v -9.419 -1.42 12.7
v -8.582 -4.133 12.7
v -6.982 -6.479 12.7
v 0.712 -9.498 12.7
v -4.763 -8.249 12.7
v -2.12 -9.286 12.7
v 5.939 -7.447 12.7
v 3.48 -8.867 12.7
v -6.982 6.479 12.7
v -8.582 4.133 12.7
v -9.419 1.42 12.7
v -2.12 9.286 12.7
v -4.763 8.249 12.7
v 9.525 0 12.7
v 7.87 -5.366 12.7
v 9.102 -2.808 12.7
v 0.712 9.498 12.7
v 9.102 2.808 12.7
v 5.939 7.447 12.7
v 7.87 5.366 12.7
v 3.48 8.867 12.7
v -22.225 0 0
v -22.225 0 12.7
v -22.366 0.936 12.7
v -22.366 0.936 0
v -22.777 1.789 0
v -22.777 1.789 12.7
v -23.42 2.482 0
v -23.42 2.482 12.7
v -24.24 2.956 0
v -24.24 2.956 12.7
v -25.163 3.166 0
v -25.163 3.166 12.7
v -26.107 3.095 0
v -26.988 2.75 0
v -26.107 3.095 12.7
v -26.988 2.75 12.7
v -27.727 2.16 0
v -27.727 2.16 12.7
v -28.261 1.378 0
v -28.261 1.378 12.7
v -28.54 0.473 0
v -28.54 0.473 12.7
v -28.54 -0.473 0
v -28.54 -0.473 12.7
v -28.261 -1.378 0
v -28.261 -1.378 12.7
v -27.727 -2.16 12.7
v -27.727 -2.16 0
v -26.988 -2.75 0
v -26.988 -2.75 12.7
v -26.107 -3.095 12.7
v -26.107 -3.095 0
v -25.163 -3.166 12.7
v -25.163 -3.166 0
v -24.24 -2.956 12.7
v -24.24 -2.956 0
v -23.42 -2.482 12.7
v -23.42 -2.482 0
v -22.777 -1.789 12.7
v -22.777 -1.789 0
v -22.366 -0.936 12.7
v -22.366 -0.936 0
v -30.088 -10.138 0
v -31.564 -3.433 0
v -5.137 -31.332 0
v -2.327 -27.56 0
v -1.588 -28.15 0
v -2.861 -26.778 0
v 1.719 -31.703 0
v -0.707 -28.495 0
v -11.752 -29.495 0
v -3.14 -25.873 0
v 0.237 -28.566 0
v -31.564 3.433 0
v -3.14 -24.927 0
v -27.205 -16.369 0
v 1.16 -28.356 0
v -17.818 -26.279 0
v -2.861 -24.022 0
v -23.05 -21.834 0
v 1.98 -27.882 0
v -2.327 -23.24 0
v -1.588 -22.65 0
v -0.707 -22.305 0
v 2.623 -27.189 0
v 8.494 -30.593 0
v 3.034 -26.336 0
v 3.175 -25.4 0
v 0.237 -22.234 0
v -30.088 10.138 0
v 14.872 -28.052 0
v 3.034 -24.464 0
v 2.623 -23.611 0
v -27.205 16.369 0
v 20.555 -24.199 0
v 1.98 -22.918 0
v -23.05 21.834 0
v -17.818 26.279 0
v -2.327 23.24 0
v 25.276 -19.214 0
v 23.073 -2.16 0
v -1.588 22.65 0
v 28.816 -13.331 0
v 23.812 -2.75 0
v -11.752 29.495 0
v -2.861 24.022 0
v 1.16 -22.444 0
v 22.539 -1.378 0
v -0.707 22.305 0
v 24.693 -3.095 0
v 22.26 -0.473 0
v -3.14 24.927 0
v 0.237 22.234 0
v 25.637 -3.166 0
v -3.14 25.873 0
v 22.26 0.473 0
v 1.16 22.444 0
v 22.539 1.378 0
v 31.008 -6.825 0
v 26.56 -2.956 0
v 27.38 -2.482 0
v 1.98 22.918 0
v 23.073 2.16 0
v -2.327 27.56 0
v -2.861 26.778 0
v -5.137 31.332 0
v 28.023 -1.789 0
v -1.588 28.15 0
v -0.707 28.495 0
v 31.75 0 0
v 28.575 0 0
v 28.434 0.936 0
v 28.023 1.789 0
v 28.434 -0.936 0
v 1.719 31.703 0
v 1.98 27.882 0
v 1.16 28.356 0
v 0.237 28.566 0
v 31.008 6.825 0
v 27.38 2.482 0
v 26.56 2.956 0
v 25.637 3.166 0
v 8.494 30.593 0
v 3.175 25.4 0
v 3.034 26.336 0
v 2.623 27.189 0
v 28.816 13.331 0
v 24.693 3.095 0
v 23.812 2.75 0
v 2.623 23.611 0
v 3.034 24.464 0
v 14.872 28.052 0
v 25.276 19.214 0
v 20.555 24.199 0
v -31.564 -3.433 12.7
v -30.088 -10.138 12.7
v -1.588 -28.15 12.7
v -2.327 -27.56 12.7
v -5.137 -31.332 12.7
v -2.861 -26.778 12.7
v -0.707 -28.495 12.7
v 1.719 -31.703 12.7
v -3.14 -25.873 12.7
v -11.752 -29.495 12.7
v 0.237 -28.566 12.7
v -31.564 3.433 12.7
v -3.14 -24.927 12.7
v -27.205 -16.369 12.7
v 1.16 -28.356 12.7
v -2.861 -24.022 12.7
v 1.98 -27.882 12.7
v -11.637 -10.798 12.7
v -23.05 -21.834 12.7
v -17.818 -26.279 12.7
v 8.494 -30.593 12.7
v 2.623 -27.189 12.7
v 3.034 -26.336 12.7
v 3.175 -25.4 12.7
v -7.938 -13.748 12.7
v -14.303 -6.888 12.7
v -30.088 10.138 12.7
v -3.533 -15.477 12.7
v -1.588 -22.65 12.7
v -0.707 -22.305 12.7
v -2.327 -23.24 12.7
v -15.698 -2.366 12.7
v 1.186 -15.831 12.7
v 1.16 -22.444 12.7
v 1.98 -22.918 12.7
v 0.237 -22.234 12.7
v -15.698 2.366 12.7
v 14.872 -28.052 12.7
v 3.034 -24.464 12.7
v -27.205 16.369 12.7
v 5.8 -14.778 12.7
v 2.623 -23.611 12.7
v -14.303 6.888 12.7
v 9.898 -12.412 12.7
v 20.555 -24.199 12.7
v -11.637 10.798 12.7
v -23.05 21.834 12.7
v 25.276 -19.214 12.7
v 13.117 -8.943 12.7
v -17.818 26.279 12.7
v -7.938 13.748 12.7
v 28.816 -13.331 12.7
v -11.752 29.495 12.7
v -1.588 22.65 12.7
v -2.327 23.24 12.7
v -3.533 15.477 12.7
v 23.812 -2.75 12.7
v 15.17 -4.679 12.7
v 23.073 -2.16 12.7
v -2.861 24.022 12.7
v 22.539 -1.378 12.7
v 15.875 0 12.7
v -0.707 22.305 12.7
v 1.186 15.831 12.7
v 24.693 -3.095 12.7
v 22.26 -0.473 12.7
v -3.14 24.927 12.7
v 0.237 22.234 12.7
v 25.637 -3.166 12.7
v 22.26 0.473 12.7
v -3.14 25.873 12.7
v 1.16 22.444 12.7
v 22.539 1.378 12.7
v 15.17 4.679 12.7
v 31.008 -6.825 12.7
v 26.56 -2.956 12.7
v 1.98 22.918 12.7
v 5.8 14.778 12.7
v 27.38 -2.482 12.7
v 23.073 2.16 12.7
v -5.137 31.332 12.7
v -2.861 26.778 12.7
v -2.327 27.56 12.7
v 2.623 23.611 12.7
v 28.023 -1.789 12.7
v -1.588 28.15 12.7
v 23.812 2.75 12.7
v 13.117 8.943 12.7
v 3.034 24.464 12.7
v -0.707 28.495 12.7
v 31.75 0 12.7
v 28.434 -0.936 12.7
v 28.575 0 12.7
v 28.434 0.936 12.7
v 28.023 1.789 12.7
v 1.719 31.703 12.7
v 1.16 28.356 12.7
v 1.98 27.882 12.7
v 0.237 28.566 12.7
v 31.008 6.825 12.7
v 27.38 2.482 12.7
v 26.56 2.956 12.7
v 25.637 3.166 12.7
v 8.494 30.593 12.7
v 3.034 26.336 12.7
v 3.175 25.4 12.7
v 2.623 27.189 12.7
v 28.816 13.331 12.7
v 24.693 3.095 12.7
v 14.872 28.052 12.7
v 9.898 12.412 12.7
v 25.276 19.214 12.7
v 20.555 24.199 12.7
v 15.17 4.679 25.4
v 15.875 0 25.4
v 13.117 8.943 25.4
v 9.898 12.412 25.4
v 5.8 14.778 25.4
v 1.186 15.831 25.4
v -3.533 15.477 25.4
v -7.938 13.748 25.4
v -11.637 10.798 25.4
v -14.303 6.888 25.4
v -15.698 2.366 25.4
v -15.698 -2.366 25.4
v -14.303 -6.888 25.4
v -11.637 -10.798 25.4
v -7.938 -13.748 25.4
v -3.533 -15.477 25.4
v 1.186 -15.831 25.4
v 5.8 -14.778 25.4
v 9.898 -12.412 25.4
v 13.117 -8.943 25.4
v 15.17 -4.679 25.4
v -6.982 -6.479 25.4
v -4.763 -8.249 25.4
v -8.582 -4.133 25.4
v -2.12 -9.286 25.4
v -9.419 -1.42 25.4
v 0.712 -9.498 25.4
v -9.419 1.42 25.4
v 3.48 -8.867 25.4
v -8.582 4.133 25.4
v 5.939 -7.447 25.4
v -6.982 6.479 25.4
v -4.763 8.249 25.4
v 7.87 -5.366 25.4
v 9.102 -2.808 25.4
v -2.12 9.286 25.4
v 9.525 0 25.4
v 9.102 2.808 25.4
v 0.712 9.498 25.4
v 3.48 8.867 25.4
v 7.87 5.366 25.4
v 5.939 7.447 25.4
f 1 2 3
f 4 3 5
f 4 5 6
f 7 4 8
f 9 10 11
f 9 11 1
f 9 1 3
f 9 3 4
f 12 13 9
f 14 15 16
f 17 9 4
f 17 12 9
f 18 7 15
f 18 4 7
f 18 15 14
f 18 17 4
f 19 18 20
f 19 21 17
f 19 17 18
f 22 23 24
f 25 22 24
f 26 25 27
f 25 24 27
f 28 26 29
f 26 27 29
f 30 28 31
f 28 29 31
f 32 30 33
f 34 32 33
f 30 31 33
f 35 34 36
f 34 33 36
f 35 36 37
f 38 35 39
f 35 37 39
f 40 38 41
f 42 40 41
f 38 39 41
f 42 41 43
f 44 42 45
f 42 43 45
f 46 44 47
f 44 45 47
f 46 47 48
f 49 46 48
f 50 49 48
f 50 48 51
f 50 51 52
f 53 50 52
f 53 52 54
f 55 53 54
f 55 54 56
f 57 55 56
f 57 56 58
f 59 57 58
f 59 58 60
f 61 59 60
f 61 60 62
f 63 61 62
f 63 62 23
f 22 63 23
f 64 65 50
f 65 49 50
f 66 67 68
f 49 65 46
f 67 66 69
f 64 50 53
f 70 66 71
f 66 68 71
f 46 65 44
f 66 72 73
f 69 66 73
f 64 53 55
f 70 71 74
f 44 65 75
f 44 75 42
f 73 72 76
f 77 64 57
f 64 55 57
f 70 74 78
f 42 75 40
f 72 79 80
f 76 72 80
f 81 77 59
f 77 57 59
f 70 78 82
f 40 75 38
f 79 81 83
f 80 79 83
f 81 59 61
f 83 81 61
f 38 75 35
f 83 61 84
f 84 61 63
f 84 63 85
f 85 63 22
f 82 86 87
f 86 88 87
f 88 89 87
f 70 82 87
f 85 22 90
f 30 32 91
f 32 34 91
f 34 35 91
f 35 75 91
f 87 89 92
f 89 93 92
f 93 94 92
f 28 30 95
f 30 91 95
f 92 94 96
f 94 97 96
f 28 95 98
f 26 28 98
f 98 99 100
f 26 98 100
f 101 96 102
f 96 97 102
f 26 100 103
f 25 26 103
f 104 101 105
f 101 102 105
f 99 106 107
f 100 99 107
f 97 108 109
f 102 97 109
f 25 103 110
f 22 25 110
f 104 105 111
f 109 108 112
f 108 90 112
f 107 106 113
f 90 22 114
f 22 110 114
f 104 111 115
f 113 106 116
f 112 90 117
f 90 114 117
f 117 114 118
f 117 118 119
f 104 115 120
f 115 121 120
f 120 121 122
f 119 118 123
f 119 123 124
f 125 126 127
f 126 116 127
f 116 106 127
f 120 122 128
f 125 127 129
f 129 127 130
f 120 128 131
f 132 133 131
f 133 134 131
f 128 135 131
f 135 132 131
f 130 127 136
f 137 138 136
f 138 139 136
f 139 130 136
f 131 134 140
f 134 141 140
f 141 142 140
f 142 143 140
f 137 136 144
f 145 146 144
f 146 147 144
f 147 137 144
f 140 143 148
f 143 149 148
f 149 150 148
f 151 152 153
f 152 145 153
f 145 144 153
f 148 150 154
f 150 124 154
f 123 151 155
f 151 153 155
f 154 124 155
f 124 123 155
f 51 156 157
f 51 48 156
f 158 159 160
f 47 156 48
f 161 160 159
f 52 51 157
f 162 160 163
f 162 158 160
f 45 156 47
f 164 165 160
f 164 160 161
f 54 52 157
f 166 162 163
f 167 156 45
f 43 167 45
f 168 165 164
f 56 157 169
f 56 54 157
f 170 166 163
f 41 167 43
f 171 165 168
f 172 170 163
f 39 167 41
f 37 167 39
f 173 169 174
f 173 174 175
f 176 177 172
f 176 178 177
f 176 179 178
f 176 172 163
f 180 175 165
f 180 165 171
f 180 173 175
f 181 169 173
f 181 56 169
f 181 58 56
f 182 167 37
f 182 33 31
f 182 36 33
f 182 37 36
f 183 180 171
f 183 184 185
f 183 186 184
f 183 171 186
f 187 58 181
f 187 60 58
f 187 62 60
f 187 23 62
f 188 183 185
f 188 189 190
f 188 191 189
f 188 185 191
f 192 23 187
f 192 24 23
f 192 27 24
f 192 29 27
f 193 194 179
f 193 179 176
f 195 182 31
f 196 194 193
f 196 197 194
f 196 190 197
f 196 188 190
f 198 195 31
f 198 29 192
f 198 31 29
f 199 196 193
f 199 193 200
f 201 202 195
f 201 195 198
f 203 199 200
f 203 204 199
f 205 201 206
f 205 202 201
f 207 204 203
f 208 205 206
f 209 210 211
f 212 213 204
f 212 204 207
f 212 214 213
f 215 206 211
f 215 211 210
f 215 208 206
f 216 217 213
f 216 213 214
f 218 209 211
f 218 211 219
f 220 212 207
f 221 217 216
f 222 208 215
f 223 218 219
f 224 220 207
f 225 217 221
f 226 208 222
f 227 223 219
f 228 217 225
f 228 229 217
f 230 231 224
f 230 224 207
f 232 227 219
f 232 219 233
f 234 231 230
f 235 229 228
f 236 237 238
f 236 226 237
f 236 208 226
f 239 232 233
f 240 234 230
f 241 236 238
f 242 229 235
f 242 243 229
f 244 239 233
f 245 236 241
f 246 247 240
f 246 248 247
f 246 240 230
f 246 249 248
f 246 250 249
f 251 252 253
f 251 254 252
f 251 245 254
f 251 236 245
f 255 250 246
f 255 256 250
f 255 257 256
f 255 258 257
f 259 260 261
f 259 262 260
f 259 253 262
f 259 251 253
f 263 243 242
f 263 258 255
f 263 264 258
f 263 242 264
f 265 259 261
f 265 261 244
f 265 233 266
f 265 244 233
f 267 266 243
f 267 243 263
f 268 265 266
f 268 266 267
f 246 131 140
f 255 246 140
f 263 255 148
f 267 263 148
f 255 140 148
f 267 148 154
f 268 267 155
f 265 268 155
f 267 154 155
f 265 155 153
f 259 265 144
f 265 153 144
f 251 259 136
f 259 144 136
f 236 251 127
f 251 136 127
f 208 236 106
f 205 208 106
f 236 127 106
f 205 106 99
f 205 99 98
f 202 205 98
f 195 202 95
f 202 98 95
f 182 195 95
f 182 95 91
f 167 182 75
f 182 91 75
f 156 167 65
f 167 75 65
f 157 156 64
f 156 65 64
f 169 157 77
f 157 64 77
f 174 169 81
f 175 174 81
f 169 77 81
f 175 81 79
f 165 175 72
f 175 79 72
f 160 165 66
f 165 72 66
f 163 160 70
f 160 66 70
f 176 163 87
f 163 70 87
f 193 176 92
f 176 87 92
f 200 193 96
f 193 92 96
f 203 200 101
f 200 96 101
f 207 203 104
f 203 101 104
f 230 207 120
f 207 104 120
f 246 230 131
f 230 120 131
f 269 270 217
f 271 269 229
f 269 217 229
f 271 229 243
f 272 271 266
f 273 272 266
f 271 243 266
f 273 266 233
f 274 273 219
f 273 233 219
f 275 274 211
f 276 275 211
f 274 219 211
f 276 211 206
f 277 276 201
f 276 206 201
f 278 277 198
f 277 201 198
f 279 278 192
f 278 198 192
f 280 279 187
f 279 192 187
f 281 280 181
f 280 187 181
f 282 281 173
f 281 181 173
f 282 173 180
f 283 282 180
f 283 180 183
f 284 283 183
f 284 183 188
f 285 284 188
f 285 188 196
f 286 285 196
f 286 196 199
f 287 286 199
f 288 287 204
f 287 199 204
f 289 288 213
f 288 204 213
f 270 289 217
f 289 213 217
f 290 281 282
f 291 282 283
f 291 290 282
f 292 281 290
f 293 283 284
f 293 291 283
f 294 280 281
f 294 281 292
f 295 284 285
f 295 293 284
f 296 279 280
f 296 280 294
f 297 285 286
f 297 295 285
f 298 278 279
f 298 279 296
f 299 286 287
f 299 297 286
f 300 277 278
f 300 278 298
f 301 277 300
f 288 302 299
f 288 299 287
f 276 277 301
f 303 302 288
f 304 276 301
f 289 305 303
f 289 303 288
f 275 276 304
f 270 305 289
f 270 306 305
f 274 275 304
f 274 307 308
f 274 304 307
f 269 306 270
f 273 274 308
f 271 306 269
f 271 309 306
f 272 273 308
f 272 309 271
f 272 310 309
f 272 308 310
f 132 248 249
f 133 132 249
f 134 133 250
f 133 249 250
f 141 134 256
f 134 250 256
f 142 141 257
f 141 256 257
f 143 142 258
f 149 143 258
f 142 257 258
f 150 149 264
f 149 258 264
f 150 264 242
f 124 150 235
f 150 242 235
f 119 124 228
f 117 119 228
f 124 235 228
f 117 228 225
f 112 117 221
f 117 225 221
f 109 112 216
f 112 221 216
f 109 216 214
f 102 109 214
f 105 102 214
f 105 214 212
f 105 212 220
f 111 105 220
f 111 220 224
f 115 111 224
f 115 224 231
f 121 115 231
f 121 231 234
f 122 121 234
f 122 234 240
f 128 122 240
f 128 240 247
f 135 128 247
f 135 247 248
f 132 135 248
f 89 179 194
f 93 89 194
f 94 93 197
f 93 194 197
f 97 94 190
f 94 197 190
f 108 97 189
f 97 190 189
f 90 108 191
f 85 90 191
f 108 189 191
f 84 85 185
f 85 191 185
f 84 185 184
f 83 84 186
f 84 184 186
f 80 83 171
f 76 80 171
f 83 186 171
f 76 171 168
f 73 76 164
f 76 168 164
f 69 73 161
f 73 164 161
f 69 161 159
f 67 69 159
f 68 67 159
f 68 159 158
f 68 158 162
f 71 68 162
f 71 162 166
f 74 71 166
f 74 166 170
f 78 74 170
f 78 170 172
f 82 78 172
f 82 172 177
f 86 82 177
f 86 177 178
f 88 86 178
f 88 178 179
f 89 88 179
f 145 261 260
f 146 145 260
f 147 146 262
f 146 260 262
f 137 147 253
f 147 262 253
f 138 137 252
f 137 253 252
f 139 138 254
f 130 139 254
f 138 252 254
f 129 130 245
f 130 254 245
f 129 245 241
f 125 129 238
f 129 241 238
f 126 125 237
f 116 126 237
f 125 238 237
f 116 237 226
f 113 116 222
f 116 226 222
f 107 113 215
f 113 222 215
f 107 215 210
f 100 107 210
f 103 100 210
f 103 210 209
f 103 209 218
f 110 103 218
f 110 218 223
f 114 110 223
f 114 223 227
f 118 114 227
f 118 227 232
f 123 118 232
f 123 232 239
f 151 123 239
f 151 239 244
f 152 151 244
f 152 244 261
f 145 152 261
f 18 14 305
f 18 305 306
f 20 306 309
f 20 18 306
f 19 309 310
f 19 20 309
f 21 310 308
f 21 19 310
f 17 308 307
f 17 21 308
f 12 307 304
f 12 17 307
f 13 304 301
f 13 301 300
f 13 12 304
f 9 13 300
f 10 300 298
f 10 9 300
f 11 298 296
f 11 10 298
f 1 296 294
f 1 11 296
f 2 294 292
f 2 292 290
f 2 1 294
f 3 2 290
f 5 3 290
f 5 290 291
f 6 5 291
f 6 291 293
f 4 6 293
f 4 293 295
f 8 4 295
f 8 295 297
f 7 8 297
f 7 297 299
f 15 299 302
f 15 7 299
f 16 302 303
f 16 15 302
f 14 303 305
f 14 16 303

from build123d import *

# Parameters (mm, degrees)
F0_R     = 31.75
F1_DEPTH = 12.7
F2_R     = 3.175
F3_DEPTH = 12.701
F2_R_2   = 15.875
F2_R_3   = 9.525
F4_DEPTH = 12.7


with BuildPart() as f1:
    # F0 (on Top) → F1 (new body)
    with BuildSketch(Plane.XY):
        Circle(F0_R)
    extrude(amount=F1_DEPTH)

    # F2 (on face) → F3 (cut, through all)
    with BuildSketch(Plane.XY.offset(12.7)):
        with Locations((-25.4, 0)):
            Circle(F2_R)
        with Locations((0, -25.4)):
            Circle(F2_R)
        with Locations((25.4, 0)):
            Circle(F2_R)
        with Locations((0, 25.4)):
            Circle(F2_R)
    extrude(amount=-F3_DEPTH, mode=Mode.SUBTRACT)

    # F2 (on face) → F4 (join)
    with BuildSketch(Plane.XY.offset(12.7)):
        Circle(F2_R_2)
        Circle(F2_R_3, mode=Mode.SUBTRACT)
    extrude(amount=F4_DEPTH)


solid = f1.part
